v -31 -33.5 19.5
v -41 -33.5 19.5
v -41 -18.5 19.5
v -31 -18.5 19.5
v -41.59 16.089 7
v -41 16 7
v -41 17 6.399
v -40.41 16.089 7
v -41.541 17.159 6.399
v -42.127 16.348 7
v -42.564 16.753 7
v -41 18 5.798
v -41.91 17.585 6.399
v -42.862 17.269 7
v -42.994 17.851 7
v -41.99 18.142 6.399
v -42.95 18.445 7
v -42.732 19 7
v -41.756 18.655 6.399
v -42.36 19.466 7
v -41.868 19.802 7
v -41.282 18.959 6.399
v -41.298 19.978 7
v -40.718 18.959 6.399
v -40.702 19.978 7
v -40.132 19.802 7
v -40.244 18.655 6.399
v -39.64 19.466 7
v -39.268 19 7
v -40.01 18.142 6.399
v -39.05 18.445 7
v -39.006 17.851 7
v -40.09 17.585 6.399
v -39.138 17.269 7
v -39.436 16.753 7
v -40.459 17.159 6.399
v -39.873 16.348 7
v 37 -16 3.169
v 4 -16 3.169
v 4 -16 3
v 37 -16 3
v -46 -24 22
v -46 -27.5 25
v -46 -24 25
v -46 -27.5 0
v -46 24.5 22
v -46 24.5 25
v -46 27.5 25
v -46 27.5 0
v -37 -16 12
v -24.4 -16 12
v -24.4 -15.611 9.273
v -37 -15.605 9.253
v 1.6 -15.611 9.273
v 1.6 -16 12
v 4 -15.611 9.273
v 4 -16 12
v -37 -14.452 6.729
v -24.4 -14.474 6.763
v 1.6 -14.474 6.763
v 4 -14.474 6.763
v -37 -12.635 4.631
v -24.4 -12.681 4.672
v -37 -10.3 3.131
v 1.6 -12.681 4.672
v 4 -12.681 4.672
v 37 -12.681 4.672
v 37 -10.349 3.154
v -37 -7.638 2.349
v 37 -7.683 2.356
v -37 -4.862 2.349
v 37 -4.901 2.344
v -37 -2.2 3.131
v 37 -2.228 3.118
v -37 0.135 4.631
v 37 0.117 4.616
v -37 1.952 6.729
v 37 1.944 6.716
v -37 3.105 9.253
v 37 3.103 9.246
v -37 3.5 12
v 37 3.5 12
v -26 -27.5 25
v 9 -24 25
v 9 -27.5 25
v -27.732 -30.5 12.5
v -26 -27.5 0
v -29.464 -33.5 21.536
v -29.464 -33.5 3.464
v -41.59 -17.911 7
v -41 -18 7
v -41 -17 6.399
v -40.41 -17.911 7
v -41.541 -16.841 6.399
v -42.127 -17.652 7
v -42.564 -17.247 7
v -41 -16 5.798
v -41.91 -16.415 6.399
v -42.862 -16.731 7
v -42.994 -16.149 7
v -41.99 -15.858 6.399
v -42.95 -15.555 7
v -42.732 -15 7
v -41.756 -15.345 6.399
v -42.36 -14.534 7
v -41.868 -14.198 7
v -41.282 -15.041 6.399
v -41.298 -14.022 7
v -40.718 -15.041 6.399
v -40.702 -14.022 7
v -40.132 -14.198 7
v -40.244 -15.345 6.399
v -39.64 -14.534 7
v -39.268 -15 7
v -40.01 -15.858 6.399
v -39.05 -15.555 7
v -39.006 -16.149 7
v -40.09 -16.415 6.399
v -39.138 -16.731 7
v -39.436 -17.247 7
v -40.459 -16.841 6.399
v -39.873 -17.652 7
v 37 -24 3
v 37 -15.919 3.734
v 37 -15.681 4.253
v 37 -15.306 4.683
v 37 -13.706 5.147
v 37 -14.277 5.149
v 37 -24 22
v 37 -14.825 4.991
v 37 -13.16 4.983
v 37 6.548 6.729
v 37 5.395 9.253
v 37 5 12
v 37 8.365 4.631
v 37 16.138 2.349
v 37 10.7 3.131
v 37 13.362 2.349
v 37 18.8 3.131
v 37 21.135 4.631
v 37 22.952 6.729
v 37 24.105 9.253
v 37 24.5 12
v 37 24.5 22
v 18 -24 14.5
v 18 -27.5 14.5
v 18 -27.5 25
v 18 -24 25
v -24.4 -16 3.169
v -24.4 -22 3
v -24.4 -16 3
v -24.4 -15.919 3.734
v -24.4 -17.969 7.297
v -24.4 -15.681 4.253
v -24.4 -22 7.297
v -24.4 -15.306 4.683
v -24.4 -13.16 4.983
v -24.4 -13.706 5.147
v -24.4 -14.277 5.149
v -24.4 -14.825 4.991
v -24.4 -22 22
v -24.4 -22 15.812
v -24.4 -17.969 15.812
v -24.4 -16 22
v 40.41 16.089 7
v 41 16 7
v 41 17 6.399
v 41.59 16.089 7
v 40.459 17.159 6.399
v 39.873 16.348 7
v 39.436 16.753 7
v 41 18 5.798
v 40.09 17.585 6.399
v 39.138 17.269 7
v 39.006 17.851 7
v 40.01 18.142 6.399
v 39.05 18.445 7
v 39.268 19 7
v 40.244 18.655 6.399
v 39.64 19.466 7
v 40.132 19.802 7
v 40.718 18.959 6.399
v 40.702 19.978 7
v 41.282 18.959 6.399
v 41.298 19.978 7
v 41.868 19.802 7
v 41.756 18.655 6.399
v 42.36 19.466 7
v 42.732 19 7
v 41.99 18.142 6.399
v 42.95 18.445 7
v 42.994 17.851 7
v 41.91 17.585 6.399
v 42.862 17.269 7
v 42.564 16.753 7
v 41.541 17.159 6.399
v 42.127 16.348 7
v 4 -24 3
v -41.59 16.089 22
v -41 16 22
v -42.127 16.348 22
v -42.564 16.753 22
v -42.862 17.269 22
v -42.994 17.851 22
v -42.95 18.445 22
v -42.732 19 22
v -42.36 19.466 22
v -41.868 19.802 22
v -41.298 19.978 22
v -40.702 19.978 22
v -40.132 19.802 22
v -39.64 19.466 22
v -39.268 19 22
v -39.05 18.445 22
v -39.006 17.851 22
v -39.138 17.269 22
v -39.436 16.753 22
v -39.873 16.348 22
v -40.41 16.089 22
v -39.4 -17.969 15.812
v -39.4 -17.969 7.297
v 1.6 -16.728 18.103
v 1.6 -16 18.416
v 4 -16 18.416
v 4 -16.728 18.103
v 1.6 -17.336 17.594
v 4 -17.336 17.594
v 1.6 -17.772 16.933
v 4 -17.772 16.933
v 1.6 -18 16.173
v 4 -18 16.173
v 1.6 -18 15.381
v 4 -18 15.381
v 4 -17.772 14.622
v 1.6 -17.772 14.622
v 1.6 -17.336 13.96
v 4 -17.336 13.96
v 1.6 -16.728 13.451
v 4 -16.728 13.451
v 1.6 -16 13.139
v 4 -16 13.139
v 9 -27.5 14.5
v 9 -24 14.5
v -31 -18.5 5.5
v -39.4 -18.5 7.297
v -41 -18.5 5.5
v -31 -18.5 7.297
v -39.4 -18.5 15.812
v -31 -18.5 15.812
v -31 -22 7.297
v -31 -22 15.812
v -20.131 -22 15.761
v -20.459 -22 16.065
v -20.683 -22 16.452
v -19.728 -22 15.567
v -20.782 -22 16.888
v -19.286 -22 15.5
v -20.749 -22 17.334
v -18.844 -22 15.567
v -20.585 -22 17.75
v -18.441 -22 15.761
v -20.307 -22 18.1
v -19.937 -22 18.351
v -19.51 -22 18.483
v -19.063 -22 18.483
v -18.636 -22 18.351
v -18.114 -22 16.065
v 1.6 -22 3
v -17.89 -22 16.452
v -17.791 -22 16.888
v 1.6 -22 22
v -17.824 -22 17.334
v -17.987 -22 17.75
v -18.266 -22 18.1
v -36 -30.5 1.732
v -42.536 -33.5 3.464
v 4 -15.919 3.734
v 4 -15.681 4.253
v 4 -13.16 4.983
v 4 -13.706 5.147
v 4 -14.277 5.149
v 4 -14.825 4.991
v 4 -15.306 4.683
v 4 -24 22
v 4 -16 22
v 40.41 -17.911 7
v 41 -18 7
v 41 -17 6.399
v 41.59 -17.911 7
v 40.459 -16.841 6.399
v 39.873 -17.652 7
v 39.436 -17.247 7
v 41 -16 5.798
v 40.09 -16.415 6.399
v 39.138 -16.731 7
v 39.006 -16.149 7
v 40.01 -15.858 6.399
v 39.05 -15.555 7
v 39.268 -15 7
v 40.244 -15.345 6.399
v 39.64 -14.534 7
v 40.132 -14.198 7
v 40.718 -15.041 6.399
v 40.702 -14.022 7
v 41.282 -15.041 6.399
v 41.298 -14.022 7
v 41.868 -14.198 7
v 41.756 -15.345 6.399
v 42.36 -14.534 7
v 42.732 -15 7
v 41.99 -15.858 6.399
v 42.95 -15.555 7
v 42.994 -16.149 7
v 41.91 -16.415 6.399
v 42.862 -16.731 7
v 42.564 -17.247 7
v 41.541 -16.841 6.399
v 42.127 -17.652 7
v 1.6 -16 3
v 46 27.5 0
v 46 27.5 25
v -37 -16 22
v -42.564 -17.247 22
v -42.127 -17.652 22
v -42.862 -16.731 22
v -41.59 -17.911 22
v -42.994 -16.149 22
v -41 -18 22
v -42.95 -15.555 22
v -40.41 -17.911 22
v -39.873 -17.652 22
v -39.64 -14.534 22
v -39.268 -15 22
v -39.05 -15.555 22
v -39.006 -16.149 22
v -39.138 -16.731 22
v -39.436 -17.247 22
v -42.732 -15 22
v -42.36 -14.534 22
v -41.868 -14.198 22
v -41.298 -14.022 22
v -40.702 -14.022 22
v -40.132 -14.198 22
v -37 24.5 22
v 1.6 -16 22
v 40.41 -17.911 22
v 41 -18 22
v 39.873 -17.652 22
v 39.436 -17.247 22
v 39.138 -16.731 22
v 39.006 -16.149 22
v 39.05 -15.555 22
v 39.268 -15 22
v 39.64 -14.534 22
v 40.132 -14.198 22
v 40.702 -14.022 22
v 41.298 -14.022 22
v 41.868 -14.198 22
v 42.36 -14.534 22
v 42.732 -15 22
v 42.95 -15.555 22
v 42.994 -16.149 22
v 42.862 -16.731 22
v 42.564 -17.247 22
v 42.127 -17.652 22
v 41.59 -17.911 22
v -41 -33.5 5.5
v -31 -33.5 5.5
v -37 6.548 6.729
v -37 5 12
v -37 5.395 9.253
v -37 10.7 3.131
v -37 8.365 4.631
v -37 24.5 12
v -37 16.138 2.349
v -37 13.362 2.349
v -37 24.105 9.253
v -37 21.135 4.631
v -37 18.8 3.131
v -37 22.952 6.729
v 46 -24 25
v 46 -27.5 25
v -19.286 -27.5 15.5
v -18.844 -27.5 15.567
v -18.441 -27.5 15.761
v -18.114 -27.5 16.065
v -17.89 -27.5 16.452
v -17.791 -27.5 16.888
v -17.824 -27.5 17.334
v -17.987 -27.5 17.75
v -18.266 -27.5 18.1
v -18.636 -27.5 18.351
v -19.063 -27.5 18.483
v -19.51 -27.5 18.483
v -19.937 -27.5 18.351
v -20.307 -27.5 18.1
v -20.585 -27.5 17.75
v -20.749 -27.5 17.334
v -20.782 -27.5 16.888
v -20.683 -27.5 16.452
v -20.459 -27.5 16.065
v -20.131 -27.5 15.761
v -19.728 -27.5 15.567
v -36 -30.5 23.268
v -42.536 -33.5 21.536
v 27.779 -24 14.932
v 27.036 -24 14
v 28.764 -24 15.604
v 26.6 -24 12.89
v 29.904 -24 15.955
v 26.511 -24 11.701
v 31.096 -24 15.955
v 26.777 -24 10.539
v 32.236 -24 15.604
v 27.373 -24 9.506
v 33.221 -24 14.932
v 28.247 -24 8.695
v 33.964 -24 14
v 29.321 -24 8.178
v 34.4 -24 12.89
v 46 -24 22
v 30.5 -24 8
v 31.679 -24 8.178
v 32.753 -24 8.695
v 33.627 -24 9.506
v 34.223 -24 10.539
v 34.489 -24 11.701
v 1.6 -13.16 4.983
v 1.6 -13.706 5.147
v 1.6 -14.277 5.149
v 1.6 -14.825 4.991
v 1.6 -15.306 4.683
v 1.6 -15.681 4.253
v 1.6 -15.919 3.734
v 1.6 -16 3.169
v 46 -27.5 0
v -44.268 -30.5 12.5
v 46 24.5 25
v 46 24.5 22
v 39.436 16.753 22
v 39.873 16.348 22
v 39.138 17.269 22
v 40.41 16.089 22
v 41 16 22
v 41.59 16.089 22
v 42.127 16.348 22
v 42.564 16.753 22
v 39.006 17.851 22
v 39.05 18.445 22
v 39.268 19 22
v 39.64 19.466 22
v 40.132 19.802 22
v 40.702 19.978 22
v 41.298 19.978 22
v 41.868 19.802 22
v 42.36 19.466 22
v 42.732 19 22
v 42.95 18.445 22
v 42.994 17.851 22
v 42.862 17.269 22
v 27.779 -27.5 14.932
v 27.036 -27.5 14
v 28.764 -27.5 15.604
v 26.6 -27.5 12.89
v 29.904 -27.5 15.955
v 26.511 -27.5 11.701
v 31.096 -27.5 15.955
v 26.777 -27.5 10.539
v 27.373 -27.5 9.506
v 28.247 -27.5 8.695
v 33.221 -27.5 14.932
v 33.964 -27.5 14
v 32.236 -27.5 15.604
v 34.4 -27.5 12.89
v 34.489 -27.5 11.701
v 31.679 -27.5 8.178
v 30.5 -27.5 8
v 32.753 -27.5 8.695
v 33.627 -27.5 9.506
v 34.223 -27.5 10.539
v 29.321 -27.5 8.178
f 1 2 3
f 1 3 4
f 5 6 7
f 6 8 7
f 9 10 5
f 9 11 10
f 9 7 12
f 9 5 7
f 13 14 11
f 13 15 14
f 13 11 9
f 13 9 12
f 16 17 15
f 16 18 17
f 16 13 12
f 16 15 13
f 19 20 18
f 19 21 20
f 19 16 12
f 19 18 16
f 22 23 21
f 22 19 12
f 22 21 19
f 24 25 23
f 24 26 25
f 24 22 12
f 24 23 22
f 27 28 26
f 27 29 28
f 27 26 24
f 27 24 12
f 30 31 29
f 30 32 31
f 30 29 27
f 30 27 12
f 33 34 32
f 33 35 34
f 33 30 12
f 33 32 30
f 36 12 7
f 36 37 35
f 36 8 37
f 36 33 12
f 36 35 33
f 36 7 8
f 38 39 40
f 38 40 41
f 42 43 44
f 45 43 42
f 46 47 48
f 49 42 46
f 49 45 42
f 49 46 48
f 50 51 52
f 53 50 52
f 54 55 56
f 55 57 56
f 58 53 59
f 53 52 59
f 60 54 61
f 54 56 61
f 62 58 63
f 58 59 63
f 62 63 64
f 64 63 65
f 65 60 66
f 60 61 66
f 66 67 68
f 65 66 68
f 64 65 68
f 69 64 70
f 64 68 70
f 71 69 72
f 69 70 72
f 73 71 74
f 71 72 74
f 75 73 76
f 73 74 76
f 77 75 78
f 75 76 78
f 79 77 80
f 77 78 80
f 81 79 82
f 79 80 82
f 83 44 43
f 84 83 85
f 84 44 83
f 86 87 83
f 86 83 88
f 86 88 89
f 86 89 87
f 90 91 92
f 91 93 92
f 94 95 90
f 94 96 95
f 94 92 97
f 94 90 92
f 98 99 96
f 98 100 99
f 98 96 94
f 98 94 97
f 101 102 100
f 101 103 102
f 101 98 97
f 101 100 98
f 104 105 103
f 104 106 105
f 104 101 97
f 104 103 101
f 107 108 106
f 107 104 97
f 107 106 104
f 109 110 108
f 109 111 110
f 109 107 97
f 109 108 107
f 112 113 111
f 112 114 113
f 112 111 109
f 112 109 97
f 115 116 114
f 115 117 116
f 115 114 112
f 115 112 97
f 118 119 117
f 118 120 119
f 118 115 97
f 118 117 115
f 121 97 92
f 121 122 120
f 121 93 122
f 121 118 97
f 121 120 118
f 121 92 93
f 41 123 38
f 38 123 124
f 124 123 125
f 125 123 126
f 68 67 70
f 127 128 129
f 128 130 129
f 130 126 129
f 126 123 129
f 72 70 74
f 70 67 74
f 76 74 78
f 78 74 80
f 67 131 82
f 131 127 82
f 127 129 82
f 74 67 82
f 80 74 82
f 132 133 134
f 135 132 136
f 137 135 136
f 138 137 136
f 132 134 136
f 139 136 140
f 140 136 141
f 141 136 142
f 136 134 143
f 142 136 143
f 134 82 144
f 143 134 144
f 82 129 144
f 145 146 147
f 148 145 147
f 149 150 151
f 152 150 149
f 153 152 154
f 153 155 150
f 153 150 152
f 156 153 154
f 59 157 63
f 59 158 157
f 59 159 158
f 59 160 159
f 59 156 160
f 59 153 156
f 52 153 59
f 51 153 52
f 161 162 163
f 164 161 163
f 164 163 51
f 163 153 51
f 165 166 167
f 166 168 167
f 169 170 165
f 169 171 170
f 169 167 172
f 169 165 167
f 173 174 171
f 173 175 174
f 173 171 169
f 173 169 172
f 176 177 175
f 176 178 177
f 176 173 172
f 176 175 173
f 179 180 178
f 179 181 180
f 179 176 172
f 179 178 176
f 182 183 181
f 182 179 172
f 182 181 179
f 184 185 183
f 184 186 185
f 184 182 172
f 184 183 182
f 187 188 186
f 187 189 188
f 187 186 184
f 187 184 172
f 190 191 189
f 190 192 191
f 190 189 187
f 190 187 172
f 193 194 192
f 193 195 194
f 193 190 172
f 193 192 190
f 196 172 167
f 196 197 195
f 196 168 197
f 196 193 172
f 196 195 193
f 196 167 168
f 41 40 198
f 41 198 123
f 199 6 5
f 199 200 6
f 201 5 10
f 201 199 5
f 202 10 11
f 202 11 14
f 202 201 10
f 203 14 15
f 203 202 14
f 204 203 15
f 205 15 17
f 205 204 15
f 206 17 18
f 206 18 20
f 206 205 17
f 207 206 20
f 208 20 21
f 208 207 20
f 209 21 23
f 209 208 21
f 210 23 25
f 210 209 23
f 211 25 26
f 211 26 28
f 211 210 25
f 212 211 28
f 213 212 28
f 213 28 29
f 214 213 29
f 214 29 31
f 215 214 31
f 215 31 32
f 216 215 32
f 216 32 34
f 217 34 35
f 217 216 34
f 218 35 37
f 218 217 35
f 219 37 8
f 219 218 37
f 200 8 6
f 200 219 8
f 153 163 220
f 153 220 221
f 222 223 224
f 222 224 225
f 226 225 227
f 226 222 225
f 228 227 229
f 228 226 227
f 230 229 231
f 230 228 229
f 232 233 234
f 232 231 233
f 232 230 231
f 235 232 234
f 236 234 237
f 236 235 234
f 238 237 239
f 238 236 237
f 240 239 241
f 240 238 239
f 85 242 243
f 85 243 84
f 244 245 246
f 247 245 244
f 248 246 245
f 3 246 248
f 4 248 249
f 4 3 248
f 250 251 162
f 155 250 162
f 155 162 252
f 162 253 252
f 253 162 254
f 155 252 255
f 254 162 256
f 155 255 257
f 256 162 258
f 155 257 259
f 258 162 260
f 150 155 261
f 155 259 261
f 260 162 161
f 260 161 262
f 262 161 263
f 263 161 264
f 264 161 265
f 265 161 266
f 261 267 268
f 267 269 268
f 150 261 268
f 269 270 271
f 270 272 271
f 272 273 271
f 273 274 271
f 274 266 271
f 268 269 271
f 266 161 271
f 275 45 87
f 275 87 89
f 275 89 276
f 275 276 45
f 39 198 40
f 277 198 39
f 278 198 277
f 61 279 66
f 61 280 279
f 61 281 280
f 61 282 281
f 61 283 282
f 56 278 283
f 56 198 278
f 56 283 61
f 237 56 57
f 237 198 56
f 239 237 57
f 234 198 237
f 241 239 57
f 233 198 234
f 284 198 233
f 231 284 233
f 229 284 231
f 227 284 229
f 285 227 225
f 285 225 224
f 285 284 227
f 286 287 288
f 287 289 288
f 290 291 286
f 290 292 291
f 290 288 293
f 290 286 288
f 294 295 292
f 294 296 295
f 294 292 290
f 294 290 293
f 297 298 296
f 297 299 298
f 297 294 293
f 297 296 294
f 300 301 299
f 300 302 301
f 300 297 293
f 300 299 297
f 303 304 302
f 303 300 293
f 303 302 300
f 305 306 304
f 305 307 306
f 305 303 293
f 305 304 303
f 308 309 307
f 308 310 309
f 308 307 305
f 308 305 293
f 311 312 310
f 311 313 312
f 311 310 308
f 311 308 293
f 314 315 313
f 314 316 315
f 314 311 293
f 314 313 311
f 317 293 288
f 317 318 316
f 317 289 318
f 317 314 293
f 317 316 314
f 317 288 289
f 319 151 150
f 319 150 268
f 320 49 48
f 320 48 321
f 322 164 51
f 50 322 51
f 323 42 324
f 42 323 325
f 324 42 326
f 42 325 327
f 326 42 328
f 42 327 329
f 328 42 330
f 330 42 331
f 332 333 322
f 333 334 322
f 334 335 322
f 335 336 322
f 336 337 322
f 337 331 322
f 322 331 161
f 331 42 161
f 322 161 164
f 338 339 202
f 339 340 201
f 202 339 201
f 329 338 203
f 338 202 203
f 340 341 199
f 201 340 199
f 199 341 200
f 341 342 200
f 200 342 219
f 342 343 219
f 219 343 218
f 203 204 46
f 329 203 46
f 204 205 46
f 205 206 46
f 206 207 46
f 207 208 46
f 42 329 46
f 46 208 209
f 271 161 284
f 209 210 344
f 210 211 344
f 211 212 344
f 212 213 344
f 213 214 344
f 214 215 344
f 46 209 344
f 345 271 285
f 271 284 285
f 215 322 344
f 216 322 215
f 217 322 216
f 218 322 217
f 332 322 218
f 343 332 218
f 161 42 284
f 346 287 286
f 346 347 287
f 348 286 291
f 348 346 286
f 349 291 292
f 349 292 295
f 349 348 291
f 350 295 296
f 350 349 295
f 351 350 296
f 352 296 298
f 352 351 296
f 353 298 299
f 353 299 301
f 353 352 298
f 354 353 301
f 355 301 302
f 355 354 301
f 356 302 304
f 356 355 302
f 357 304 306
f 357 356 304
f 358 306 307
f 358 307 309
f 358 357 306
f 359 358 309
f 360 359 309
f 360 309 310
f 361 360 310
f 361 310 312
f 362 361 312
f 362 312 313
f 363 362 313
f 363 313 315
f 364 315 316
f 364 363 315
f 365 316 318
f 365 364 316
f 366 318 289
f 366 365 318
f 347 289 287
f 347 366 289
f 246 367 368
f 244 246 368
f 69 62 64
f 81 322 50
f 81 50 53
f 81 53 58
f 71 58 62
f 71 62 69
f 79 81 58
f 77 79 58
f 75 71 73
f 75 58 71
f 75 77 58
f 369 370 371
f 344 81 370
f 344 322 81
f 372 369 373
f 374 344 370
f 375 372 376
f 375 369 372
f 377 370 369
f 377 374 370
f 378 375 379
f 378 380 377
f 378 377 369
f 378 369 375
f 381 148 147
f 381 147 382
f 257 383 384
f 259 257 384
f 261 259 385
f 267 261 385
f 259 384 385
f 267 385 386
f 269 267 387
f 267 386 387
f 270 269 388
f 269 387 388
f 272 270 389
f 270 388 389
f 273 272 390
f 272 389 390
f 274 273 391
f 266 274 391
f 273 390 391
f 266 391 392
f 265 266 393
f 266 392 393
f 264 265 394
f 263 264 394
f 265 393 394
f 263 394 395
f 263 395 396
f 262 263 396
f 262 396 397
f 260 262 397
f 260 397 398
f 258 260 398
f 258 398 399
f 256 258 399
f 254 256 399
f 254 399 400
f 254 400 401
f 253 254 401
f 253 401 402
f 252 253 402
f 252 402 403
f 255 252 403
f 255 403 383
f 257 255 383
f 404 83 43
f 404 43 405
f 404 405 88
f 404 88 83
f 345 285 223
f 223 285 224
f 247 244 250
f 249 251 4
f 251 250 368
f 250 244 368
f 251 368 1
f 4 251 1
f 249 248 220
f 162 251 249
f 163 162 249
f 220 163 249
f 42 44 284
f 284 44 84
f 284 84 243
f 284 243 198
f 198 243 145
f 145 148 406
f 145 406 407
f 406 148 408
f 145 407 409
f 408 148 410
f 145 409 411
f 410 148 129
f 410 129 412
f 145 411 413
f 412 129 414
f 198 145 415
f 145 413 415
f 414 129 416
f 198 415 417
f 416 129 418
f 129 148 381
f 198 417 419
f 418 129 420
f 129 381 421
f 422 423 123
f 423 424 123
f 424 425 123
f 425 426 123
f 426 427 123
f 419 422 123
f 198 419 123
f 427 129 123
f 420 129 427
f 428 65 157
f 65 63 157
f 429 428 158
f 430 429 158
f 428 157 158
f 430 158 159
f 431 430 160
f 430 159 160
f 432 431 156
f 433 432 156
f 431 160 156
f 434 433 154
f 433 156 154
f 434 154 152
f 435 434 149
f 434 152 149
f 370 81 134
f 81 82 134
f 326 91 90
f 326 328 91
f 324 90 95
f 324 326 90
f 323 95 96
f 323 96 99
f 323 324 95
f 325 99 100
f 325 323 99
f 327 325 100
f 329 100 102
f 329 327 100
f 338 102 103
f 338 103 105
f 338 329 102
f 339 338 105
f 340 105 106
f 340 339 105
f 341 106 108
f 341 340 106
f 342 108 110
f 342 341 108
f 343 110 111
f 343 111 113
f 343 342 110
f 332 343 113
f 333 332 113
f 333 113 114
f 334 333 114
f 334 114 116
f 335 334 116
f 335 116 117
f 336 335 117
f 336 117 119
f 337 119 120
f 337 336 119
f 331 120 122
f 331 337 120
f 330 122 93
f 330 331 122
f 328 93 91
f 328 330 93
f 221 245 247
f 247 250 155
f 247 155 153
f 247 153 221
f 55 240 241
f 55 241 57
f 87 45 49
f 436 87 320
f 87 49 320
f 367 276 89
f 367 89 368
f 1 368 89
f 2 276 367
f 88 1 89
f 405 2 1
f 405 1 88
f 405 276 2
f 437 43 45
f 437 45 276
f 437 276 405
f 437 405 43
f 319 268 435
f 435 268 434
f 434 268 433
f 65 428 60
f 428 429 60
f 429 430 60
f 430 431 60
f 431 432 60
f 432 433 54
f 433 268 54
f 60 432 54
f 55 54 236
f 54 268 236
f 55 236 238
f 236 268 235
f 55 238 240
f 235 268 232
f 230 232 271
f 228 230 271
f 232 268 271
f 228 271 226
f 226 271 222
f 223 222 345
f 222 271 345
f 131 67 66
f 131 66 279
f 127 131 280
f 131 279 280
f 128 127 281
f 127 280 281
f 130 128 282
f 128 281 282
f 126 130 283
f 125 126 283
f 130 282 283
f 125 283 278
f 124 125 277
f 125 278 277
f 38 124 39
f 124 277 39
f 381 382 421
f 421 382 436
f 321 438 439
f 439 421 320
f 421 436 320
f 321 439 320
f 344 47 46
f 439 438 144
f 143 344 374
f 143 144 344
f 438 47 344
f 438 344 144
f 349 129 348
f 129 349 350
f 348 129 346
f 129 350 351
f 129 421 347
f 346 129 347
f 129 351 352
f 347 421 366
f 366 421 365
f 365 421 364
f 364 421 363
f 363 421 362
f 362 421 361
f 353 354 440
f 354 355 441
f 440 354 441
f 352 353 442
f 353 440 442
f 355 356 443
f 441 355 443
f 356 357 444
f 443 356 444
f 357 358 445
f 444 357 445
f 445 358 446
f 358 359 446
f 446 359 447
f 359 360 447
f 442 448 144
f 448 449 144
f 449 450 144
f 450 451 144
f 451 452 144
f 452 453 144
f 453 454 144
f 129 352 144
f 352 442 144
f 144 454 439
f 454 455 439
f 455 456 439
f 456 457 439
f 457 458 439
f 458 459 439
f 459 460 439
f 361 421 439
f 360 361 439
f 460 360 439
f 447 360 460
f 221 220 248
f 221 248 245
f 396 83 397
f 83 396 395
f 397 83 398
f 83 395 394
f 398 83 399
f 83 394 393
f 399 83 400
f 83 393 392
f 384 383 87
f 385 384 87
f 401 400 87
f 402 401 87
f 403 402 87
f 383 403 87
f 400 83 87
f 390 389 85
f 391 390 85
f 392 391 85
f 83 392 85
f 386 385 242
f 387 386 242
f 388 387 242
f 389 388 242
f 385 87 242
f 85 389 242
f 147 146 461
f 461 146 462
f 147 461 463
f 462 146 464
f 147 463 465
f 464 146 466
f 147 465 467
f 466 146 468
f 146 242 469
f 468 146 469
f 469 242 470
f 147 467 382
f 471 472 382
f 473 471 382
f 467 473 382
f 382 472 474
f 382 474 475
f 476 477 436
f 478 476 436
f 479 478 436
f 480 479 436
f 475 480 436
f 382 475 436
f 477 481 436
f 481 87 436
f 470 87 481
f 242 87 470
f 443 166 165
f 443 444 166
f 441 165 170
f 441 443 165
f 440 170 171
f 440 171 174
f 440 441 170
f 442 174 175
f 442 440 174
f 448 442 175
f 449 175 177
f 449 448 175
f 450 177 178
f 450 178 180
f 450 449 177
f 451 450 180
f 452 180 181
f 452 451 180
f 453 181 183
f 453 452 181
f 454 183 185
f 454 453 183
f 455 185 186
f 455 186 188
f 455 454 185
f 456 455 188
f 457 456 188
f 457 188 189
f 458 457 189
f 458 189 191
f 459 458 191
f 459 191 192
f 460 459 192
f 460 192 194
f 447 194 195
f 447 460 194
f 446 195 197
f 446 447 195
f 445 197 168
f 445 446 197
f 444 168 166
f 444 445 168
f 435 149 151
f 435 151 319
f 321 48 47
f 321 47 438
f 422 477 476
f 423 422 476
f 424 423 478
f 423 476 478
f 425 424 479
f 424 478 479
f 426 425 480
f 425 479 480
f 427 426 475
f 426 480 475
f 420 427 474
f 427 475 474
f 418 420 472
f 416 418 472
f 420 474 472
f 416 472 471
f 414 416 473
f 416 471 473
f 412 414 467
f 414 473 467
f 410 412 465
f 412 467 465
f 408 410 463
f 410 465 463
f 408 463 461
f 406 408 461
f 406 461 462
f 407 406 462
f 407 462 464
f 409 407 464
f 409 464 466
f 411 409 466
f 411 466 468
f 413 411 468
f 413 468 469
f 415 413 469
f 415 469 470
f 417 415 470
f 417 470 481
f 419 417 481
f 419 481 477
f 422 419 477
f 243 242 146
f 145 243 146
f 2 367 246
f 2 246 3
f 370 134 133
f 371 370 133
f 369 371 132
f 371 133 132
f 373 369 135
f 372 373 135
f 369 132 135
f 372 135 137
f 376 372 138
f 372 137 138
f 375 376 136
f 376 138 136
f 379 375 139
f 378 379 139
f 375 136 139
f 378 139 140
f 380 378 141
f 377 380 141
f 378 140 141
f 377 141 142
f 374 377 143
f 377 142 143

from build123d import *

# Parameters (mm, degrees)
SKETCH1_W            = 92
SKETCH1_H            = 55
BODY_DEPTH           = 25
BATTERY_DEPTH        = 37
SKETCH3_W            = 33
SKETCH3_H            = 8
CONTROLLER_DEPTH     = 22
CUT_EXTRUDE3_REACH   = 77.934
SKETCH4_R            = 4
CONNECTOR_REACH      = 77.934
SKETCH5_W            = 9
SKETCH5_H            = 10.5
SKETCH6_W            = 26
SKETCH6_H            = 6
CHARGER_DEPTH        = 22
CHGLED_REACH         = 77.934
SKETCH7_R            = 1.5
SKETCH8_W            = 20
SKETCH8_H            = 25
BOSS_EXTRUDE1_DEPTH  = 6
BOSS_EXTRUDE1_TAPER  = 30
SKETCH9_W            = 10
SKETCH9_H            = 14
CUT_EXTRUDE7_DEPTH   = 15
SKETCH10_W           = 8.515500197
SKETCH10_H           = 4.030526349
CUT_EXTRUDE8_DEPTH   = 15
SKETCH11_W           = 3
SKETCH11_H           = 48.5
CUT_EXTRUDE9_DEPTH   = 102.050729983
LPATTERN1_COUNT      = 2
LPATTERN1_PITCH      = 82
LPATTERN1_COUNT_DIR2 = 2
LPATTERN1_PITCH_DIR2 = 34
FILLET1_R            = 2
SKETCH14_R           = 2.730125357
CUT_EXTRUDE10_DEPTH  = 10


with BuildPart() as part:
    # Sketch1 → Body (new body)
    with BuildSketch(Plane.XY):
        Rectangle(SKETCH1_W, SKETCH1_H)
    extrude(amount=BODY_DEPTH)

    # Sketch2 → Battery (cut, symmetric)
    with BuildSketch(Plane(origin=(0, 0, 0), x_dir=(0, 0, -1), z_dir=(1, 0, 0))):
        with BuildLine():
            Line((-12, 3.5), (-12, 5))
            ThreePointArc((-12, 5), (-2.25, 14.75), (-12, 24.5))
            Line((-12, 24.5), (-28.22158826, 24.5))
            Line((-28.22158826, 24.5), (-28.22158826, -16))
            Line((-28.22158826, -16), (-12, -16))
            ThreePointArc((-12, -16), (-2.25, -6.25), (-12, 3.5))
        make_face()
    extrude(amount=BATTERY_DEPTH, both=True, mode=Mode.SUBTRACT)

    # Sketch3 → Controller (cut)
    with BuildSketch(Plane.XY.offset(25)):
        with Locations((20.5, -20)):
            Rectangle(SKETCH3_W, SKETCH3_H)
    extrude(amount=-CONTROLLER_DEPTH, mode=Mode.SUBTRACT)

    # Sketch4 → Cut-Extrude3 (cut, up to next)
    with BuildSketch(Plane.XZ.offset(27.5), mode=Mode.PRIVATE) as cut_extrude3_sk1:
        with Locations((30.5, 12)):
            Circle(SKETCH4_R)
    cut_extrude3_tool1 = extrude(cut_extrude3_sk1.sketch, amount=-CUT_EXTRUDE3_REACH, mode=Mode.PRIVATE) & part.part
    add(cut_extrude3_tool1.solids().sort_by_distance((30.5, -27.5, 12))[0], mode=Mode.SUBTRACT)

    # Sketch5 → Connector (cut, up to next)
    with BuildSketch(Plane.XZ.offset(27.5), mode=Mode.PRIVATE) as connector_sk1:
        with Locations((13.5, 19.75)):
            Rectangle(SKETCH5_W, SKETCH5_H)
    connector_tool1 = extrude(connector_sk1.sketch, amount=-CONNECTOR_REACH, mode=Mode.PRIVATE) & part.part
    add(connector_tool1.solids().sort_by_distance((13.5, -27.5, 19.75))[0], mode=Mode.SUBTRACT)

    # Sketch6 → Charger (cut)
    with BuildSketch(Plane.XY.offset(25)):
        with Locations((-11.4, -19)):
            Rectangle(SKETCH6_W, SKETCH6_H)
    extrude(amount=-CHARGER_DEPTH, mode=Mode.SUBTRACT)

    # Sketch7 → ChgLED (cut, up to next)
    with BuildSketch(Plane(origin=(0, -27.5, 0), x_dir=(-1, 0, 0), z_dir=(0, -1, 0)), mode=Mode.PRIVATE) as chgled_sk1:
        with Locations((19.286360004, -17)):
            Circle(SKETCH7_R)
    chgled_tool1 = extrude(chgled_sk1.sketch, amount=-CHGLED_REACH, mode=Mode.PRIVATE) & part.part
    add(chgled_tool1.solids().sort_by_distance((-19.28636, -27.5, 17))[0], mode=Mode.SUBTRACT)

    # Sketch8 → Boss-Extrude1 (add)
    with BuildSketch(Plane.XZ.offset(27.5)):
        with Locations((-36, 12.5)):
            Rectangle(SKETCH8_W, SKETCH8_H)
    extrude(amount=BOSS_EXTRUDE1_DEPTH, taper=BOSS_EXTRUDE1_TAPER)

    # Sketch9 → Cut-Extrude7 (cut)
    with BuildSketch(Plane.XZ.offset(33.5)):
        with Locations((-36, 12.5)):
            Rectangle(SKETCH9_W, SKETCH9_H)
    extrude(amount=-CUT_EXTRUDE7_DEPTH, mode=Mode.SUBTRACT)

    # Sketch10 → Cut-Extrude8 (cut)
    with BuildSketch(Plane(origin=(-24.4, 0, 0), x_dir=(0, 0, -1), z_dir=(1, 0, 0))):
        with Locations((-11.554387417, -19.984736826)):
            Rectangle(SKETCH10_W, SKETCH10_H)
    extrude(amount=-CUT_EXTRUDE8_DEPTH, mode=Mode.SUBTRACT)

    # Sketch11 → Cut-Extrude9 (cut, through all)
    with BuildSketch(Plane(origin=(46, 0, 0), x_dir=(0, 0, -1), z_dir=(1, 0, 0))):
        with Locations((-23.5, 0.25)):
            Rectangle(SKETCH11_W, SKETCH11_H)
    extrude(amount=-CUT_EXTRUDE9_DEPTH, mode=Mode.SUBTRACT)

    # Sketch13 → Ø4.0mm Dowel Hole1 (revolve, cut)
    with BuildSketch(Plane(origin=(41, 18, 22), x_dir=(0, -1, 0), z_dir=(1, 0, 0))):
        Polygon((0, 0), (0, 16.201721238), (2, 15), (2, 0), align=None)
    f_4_0mm_dowel_hole1 = revolve(axis=Axis((41, 18, 28.35), (0, 0, -1)), mode=Mode.SUBTRACT)

    # LPattern1: 4.0mm Dowel Hole1 2 × 2
    with Locations(*[(-i * LPATTERN1_PITCH, -j * LPATTERN1_PITCH_DIR2, 0) for i in range(LPATTERN1_COUNT) for j in range(LPATTERN1_COUNT_DIR2) if (i, j) != (0, 0)]):
        add(f_4_0mm_dowel_hole1, mode=Mode.SUBTRACT)

    # Fillet1
    fillet1_edges = [part.edges().sort_by_distance(p)[0] for p in [
        (-11.4, -16, 12),
        (20.5, -16, 12),
    ]]
    fillet(fillet1_edges, radius=FILLET1_R)

    # Sketch14 → Cut-Extrude10 (cut)
    with BuildSketch(Plane(origin=(0, 0, 0), x_dir=(0, 0, -1), z_dir=(1, 0, 0))):
        with Locations((-15.777227018, -15.298336579)):
            Circle(SKETCH14_R)
    extrude(amount=CUT_EXTRUDE10_DEPTH, mode=Mode.SUBTRACT)


solid = part.part
